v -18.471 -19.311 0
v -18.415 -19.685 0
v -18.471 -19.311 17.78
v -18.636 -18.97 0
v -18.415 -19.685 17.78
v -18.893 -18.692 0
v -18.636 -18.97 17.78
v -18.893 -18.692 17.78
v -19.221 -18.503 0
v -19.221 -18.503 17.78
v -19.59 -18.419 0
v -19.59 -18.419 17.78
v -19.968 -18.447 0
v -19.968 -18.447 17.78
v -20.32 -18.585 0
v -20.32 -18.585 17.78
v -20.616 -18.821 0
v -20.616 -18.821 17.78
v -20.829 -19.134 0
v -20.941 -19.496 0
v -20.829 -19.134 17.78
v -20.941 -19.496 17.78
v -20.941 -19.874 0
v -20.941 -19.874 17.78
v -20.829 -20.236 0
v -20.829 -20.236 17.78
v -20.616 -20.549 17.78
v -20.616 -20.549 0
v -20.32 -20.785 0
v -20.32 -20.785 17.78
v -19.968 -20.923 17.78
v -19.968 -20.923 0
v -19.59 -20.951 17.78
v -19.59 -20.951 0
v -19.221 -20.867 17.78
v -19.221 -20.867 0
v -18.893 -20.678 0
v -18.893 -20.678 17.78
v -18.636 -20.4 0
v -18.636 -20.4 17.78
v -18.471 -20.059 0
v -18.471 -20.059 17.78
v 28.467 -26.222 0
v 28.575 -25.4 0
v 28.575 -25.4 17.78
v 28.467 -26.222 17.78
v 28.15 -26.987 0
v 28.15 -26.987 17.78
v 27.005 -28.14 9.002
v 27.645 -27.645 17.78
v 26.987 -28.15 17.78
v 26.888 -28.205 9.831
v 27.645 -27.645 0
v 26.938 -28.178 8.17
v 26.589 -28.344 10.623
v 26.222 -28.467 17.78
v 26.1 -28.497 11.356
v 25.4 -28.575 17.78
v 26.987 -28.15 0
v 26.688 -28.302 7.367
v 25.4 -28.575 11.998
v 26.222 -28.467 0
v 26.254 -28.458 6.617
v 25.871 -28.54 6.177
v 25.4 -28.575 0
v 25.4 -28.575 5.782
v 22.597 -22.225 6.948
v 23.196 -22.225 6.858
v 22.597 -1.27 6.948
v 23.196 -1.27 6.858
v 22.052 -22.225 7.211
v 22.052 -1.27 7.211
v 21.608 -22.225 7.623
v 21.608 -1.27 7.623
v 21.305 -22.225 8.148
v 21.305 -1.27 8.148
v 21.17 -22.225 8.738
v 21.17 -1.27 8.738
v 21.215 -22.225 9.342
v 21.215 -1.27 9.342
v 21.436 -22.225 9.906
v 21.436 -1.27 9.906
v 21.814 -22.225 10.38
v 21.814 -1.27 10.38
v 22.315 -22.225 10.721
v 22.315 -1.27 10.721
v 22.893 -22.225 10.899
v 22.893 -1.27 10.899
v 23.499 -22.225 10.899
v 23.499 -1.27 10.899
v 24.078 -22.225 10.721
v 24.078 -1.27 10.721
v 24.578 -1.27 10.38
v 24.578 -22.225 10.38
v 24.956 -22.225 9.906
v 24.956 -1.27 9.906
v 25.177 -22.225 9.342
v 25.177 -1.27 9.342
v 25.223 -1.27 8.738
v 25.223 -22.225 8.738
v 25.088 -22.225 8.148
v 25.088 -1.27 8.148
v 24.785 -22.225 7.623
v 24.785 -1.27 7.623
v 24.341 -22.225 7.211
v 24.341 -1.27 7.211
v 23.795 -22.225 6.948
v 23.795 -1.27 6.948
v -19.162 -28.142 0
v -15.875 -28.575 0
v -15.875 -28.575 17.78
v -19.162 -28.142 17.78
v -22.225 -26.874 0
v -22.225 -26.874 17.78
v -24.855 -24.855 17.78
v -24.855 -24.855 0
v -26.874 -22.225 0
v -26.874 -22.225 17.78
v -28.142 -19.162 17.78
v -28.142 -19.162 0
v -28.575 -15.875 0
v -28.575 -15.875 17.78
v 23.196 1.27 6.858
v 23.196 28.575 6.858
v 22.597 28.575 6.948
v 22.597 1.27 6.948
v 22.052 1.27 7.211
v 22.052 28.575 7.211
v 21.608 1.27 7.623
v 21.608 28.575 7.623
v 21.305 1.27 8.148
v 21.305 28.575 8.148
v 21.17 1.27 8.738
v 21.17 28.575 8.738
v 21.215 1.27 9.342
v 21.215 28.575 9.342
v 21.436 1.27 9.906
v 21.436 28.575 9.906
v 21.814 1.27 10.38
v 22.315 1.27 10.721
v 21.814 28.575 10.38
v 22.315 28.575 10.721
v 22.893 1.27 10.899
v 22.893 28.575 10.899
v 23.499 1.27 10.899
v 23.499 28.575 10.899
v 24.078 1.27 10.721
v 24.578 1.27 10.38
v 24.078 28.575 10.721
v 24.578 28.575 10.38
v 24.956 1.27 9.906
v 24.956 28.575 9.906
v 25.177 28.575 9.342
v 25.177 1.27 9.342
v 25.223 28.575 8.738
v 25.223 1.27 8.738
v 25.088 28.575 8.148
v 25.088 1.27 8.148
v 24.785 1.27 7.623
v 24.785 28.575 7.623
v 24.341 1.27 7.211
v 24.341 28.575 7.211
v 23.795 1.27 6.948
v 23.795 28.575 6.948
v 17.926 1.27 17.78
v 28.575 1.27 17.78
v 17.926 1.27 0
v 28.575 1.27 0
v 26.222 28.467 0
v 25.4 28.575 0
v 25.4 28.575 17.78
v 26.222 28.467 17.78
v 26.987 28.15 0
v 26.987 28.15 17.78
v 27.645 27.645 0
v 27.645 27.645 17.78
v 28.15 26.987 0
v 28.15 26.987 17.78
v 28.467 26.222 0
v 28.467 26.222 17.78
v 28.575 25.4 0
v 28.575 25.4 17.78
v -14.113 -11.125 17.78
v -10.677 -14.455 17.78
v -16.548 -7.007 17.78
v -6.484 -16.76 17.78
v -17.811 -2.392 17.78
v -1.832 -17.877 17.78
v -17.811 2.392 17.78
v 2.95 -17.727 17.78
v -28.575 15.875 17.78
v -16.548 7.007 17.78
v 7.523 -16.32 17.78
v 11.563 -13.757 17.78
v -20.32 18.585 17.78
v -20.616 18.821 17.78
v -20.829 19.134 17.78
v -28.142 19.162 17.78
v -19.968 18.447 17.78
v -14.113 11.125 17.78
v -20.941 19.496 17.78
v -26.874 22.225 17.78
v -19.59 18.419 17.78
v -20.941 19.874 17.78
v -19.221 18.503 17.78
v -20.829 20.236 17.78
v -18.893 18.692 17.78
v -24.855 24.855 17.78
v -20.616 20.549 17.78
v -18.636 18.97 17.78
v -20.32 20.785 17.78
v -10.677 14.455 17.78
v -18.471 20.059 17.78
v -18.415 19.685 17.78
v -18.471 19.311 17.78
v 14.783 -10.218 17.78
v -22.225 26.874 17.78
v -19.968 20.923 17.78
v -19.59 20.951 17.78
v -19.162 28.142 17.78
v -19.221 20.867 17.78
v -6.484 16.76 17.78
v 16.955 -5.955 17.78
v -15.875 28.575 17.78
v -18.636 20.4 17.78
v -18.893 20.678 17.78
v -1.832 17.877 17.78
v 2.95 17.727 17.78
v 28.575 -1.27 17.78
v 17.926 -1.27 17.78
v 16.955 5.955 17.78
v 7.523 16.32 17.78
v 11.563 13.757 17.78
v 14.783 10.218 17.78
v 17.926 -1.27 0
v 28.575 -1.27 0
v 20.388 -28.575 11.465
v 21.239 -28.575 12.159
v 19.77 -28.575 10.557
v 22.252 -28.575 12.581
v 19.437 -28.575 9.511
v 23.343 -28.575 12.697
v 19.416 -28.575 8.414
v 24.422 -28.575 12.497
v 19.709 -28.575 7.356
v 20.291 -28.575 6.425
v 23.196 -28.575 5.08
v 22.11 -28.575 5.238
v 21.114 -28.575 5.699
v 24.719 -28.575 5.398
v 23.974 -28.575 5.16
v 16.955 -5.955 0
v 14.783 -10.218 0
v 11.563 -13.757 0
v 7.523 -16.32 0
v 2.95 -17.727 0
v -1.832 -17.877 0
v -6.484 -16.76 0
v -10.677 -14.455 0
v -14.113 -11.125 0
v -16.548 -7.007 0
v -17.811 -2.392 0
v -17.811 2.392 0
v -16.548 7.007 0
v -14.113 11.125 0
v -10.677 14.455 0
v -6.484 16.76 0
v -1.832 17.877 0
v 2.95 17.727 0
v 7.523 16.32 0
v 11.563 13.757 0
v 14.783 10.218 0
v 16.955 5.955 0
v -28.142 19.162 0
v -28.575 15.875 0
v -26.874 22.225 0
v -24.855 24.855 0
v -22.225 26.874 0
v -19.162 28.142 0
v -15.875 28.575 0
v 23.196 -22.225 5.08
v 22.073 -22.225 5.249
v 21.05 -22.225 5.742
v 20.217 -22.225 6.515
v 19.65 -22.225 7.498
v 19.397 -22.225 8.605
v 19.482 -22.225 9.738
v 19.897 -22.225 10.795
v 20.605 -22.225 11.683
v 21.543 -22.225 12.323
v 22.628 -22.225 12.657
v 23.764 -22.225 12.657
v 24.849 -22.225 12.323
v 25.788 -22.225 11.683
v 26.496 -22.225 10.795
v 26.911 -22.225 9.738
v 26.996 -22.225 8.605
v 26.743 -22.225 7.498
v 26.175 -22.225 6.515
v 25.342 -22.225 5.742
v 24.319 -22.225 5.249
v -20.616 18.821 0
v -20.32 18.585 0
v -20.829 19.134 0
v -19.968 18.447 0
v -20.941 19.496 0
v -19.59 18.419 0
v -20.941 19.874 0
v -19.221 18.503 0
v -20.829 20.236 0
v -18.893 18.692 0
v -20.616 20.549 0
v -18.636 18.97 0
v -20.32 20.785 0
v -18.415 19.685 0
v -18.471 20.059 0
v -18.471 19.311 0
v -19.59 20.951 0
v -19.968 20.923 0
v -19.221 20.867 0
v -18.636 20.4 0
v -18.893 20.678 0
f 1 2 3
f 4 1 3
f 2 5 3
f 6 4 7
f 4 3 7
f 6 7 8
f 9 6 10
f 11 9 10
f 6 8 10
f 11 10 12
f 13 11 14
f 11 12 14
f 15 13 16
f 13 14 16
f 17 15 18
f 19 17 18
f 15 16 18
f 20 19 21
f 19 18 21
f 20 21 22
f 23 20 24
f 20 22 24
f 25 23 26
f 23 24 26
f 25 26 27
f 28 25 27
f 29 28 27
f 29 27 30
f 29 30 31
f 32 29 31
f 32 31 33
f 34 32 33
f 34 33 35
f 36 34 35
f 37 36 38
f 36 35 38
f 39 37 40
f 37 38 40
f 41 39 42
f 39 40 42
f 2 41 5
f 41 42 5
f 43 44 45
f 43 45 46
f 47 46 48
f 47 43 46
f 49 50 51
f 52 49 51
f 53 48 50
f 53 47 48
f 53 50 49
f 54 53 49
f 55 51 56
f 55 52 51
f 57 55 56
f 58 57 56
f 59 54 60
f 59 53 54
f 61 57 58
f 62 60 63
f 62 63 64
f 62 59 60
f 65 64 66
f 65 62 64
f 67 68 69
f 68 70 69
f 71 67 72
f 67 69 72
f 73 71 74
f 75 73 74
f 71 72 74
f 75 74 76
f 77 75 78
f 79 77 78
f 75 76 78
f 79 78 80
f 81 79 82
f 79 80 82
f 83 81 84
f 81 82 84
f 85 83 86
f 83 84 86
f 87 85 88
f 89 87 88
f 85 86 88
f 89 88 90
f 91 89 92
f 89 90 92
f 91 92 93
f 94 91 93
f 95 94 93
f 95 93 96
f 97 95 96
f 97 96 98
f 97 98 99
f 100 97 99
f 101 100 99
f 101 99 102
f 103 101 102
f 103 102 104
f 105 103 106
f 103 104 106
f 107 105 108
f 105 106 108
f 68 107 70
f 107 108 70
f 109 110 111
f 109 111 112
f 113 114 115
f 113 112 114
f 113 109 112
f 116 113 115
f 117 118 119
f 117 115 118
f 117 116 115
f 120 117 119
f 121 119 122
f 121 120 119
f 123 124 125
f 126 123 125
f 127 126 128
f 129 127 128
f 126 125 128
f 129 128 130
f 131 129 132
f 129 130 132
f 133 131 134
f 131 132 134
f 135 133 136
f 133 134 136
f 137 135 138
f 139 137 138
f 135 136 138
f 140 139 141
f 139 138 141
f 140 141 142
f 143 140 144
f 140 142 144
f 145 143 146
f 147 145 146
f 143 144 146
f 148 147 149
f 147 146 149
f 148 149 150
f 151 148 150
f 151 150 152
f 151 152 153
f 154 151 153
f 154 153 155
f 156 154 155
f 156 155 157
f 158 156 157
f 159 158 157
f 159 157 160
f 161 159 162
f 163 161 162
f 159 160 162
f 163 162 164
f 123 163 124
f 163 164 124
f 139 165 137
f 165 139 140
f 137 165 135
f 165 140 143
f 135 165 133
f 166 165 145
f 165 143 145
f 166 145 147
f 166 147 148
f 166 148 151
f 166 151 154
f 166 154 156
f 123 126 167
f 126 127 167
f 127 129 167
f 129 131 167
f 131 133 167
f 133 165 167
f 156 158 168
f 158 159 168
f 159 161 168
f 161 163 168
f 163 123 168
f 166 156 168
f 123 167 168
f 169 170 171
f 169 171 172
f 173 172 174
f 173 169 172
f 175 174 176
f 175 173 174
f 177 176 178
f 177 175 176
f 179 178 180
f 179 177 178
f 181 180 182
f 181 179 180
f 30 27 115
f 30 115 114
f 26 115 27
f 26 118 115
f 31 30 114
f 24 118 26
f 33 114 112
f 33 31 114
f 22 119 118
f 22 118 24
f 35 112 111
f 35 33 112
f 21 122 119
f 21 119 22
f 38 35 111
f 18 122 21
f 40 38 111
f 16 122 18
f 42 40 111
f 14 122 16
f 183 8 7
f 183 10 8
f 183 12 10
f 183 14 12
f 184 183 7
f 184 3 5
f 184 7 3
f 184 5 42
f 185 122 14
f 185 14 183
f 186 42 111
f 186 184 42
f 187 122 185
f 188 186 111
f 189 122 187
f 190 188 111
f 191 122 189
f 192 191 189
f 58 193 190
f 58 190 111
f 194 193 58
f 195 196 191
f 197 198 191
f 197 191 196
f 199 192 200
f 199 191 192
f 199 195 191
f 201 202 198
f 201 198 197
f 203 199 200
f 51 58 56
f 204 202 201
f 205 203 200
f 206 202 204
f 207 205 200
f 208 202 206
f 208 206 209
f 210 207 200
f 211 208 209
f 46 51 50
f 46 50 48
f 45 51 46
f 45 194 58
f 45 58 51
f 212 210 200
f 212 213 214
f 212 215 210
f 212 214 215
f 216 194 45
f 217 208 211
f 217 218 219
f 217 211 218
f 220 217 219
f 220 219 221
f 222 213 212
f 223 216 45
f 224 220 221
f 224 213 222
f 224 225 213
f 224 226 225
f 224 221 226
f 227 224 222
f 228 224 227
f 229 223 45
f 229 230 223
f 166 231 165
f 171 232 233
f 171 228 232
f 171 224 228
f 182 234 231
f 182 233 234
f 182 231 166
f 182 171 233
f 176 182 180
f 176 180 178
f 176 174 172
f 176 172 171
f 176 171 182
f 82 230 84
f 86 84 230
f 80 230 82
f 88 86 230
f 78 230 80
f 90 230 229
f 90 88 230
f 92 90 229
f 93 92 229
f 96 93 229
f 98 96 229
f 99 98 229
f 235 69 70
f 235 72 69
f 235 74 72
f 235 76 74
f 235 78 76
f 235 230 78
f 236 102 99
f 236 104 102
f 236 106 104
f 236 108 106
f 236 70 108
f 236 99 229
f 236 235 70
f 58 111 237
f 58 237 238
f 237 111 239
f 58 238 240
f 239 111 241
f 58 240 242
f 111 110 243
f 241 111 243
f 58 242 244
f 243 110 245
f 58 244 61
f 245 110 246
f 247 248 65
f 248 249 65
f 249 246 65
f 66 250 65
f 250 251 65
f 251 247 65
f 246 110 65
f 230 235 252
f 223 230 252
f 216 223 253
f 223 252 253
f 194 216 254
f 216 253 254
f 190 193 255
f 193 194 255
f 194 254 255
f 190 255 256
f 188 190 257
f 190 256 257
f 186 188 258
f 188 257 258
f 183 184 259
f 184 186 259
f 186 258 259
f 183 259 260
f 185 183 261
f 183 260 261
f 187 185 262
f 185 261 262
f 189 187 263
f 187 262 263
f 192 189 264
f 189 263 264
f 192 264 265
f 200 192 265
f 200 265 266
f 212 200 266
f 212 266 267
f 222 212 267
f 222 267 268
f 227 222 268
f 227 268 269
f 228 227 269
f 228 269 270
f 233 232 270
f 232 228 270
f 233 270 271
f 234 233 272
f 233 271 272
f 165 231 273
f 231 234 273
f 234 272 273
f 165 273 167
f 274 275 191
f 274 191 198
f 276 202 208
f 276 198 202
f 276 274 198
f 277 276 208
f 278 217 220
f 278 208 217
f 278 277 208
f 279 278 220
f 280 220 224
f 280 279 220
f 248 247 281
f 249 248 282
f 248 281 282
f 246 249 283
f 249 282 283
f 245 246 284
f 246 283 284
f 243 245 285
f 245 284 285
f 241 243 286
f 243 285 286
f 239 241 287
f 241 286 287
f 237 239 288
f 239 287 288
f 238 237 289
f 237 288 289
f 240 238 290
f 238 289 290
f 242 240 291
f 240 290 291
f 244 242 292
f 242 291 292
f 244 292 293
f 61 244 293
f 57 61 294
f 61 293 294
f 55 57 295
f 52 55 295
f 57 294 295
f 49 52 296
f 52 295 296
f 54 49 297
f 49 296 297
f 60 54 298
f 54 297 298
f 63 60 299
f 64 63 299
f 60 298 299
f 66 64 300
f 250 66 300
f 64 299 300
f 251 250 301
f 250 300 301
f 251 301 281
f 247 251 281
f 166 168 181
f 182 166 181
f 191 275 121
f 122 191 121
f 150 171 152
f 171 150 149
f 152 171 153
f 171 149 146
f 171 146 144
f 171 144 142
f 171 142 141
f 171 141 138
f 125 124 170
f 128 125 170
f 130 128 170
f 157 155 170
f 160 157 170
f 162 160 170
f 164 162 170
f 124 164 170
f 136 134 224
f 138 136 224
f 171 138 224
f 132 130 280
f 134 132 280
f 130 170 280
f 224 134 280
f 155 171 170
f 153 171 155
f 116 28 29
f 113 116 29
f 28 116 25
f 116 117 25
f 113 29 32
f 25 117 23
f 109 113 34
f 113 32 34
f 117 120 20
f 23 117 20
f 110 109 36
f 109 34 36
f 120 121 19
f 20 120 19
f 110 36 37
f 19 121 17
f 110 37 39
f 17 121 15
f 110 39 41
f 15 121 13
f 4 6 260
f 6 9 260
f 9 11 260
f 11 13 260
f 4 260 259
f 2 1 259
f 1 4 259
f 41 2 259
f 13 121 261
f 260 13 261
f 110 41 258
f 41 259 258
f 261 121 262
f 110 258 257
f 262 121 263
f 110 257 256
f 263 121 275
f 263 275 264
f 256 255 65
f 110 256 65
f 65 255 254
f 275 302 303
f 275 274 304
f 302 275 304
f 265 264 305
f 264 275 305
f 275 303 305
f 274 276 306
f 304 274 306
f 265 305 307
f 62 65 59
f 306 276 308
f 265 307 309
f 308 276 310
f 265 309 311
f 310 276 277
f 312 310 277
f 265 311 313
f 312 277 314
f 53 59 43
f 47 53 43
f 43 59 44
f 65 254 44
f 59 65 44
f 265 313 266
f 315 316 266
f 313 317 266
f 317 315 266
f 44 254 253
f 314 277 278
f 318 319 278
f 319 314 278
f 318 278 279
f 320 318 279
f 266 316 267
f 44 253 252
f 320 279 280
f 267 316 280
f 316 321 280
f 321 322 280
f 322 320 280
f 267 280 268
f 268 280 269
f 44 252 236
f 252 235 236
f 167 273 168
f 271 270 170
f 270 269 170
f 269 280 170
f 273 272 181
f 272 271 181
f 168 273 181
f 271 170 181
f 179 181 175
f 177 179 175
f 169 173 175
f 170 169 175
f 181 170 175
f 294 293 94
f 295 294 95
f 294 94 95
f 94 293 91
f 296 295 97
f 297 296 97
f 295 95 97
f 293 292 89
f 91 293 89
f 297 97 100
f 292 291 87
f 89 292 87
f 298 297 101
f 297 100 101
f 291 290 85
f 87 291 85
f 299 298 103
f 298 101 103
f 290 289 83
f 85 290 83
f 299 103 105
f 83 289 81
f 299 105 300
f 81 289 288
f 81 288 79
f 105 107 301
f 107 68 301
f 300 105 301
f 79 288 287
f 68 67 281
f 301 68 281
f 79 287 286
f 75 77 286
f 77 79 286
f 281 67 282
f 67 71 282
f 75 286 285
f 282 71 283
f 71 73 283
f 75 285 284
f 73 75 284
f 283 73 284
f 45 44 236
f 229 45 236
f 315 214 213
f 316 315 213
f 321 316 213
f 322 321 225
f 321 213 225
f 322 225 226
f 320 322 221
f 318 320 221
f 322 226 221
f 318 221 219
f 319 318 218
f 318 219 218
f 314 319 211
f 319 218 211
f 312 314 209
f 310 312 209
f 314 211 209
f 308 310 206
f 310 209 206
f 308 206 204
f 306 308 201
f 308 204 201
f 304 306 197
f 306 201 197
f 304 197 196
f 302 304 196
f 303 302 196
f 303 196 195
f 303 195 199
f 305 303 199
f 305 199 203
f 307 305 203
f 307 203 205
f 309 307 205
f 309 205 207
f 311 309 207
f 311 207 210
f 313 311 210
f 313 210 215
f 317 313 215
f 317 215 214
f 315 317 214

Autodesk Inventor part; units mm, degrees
ref_plane "YZ Plane" through (0, 0, 0) normal (1, 0, 0) x (0, 1, 0)
ref_plane "XZ Plane" through (0, 0, 0) normal (0, 1, 0) x (-1, 0, 0)
ref_plane "XY Plane" through (0, 0, 0) normal (0, 0, 1) x (1, 0, 0)
sketch "Sketch1" plane through (0, 0, 0) normal (0, 0, 1) x (1, 0, 0)
  line L0 (-15.875, -28.575) -> (25.4, -28.575)
  line L1 (25.4, 28.575) -> (-15.875, 28.575)
  line L2 (-28.575, 15.875) -> (-28.575, -15.875)
  line L3 (-28.575, -28.575) -> (28.575, 28.575) construction
  line L4 (28.575, -28.575) -> (-28.575, 28.575) construction
  arc A0 (-15.875, 28.575) -> (-28.575, 15.875) centre (-15.875, 15.875) ccw
  arc A1 (-28.575, -15.875) -> (-15.875, -28.575) centre (-15.875, -15.875) ccw
  arc A2 (28.575, 25.4) -> (25.4, 28.575) centre (25.4, 25.4) ccw
  arc A3 (25.4, -28.575) -> (28.575, -25.4) centre (25.4, -25.4) ccw
  arc A4 (17.9256, 1.27) -> (17.9256, -1.27) centre (0, 0) ccw
  line L5 (18.2118, 5.08) -> (18.2118, -5.08) construction
  line L6 (17.9256, 1.27) -> (28.575, 1.27)
  line L7 (17.9256, -1.27) -> (28.575, -1.27)
  line L8 (28.575, -25.4) -> (28.575, -1.27)
  line L9 (28.575, 1.27) -> (28.575, 25.4)
  point P0 (23.2503, 1.27)
  point P1 (23.2503, -1.27)
  dimension "d0" = 57.15
  dimension "d1" = 57.15
  dimension "d2" = 12.7
  dimension "d3" = 3.175
  dimension "d5" = 10.16
  dimension "d8" = 28.575
  dimension "d11" = 57.15
  dimension "d14" = 2.54
  dimension "d23" = 35.941
extrude "Extrusion1" add sketch "Sketch1" along normal blind 17.78
sketch "Sketch2" plane through (17.9256, -1.27, 0) normal (0, 1, 0) x (1, 0, 0)
  line L0 (0, 0) -> (10.6494, 0) projected
  line L1 (0, 0) -> (0, -17.78) projected
  line L2 (10.6494, -17.78) -> (0, -17.78) projected
  line L3 (10.6494, 0) -> (10.6494, -17.78) projected
  circle A0 centre (5.2706, -8.89) radius 1.27
  point P0 (-17.9256, 0)
  dimension "d15" = 2.54
hole "Hole1" at (23.1962, -1.27, 8.89) direction (0, -1, 0) diameter 2.54 end through all
sketch "Sketch3" plane through (-15.875, -28.575, 0) normal (0, -1, 0) x (1, 0, 0)
  circle A0 centre (39.0712, 8.89) radius 1.27 projected
  point P0 (15.875, 0)
  point P1 (38.1, 9.7084)
  point P2 (38.1, 8.0716)
hole "Hole2" at (23.1962, -28.575, 8.89) direction (0, 1, 0) diameter 4.064 end through all counterbore diameter 7.62 counterbore depth 6.35
sketch "Sketch4" plane through (0, 0, 17.78) normal (0, 0, 1) x (1, 0, 0)
  point P0 (0, 0)
sketch "Sketch5" plane through (0, 0, 17.78) normal (0, 0, 1) x (1, 0, 0)
  point P0 (0, 0)
sketch "Sketch6" plane through (0, 0, 17.78) normal (0, 0, 1) x (1, 0, 0)
  line L0 (25.4, 28.575) -> (-15.875, 28.575) projected
  arc A0 (-15.875, 28.575) -> (-28.575, 15.875) centre (-15.875, 15.875) ccw projected
  line L1 (-28.575, 15.875) -> (-28.575, -15.875) projected
  arc A1 (-28.575, -15.875) -> (-15.875, -28.575) centre (-15.875, -15.875) ccw projected
  line L2 (-15.875, -28.575) -> (25.4, -28.575) projected
  arc A2 (25.4, -28.575) -> (28.575, -25.4) centre (25.4, -25.4) ccw projected
  line L3 (28.575, -25.4) -> (28.575, -1.27) projected
  line L4 (28.575, -1.27) -> (17.9256, -1.27) projected
  arc A3 (17.9256, 1.27) -> (17.9256, -1.27) centre (0, 0) ccw projected
  line L5 (17.9256, 1.27) -> (28.575, 1.27) projected
  line L6 (28.575, 1.27) -> (28.575, 25.4) projected
  arc A4 (28.575, 25.4) -> (25.4, 28.575) centre (25.4, 25.4) ccw projected
  circle A5 centre (-19.685, -19.685) radius 1.27
  circle A6 centre (-19.685, 19.685) radius 1.27
  dimension "d31" = 2.54
  dimension "d32" = 3.81
  dimension "d33" = 3.81
  dimension "d34" = 2.54
  dimension "d35" = 3.81
  dimension "d36" = 3.81
extrude "Extrusion2" cut sketch "Sketch6" against normal blind 25.4 contours A5 | A6
properties part number "mOTORHOLDER"
